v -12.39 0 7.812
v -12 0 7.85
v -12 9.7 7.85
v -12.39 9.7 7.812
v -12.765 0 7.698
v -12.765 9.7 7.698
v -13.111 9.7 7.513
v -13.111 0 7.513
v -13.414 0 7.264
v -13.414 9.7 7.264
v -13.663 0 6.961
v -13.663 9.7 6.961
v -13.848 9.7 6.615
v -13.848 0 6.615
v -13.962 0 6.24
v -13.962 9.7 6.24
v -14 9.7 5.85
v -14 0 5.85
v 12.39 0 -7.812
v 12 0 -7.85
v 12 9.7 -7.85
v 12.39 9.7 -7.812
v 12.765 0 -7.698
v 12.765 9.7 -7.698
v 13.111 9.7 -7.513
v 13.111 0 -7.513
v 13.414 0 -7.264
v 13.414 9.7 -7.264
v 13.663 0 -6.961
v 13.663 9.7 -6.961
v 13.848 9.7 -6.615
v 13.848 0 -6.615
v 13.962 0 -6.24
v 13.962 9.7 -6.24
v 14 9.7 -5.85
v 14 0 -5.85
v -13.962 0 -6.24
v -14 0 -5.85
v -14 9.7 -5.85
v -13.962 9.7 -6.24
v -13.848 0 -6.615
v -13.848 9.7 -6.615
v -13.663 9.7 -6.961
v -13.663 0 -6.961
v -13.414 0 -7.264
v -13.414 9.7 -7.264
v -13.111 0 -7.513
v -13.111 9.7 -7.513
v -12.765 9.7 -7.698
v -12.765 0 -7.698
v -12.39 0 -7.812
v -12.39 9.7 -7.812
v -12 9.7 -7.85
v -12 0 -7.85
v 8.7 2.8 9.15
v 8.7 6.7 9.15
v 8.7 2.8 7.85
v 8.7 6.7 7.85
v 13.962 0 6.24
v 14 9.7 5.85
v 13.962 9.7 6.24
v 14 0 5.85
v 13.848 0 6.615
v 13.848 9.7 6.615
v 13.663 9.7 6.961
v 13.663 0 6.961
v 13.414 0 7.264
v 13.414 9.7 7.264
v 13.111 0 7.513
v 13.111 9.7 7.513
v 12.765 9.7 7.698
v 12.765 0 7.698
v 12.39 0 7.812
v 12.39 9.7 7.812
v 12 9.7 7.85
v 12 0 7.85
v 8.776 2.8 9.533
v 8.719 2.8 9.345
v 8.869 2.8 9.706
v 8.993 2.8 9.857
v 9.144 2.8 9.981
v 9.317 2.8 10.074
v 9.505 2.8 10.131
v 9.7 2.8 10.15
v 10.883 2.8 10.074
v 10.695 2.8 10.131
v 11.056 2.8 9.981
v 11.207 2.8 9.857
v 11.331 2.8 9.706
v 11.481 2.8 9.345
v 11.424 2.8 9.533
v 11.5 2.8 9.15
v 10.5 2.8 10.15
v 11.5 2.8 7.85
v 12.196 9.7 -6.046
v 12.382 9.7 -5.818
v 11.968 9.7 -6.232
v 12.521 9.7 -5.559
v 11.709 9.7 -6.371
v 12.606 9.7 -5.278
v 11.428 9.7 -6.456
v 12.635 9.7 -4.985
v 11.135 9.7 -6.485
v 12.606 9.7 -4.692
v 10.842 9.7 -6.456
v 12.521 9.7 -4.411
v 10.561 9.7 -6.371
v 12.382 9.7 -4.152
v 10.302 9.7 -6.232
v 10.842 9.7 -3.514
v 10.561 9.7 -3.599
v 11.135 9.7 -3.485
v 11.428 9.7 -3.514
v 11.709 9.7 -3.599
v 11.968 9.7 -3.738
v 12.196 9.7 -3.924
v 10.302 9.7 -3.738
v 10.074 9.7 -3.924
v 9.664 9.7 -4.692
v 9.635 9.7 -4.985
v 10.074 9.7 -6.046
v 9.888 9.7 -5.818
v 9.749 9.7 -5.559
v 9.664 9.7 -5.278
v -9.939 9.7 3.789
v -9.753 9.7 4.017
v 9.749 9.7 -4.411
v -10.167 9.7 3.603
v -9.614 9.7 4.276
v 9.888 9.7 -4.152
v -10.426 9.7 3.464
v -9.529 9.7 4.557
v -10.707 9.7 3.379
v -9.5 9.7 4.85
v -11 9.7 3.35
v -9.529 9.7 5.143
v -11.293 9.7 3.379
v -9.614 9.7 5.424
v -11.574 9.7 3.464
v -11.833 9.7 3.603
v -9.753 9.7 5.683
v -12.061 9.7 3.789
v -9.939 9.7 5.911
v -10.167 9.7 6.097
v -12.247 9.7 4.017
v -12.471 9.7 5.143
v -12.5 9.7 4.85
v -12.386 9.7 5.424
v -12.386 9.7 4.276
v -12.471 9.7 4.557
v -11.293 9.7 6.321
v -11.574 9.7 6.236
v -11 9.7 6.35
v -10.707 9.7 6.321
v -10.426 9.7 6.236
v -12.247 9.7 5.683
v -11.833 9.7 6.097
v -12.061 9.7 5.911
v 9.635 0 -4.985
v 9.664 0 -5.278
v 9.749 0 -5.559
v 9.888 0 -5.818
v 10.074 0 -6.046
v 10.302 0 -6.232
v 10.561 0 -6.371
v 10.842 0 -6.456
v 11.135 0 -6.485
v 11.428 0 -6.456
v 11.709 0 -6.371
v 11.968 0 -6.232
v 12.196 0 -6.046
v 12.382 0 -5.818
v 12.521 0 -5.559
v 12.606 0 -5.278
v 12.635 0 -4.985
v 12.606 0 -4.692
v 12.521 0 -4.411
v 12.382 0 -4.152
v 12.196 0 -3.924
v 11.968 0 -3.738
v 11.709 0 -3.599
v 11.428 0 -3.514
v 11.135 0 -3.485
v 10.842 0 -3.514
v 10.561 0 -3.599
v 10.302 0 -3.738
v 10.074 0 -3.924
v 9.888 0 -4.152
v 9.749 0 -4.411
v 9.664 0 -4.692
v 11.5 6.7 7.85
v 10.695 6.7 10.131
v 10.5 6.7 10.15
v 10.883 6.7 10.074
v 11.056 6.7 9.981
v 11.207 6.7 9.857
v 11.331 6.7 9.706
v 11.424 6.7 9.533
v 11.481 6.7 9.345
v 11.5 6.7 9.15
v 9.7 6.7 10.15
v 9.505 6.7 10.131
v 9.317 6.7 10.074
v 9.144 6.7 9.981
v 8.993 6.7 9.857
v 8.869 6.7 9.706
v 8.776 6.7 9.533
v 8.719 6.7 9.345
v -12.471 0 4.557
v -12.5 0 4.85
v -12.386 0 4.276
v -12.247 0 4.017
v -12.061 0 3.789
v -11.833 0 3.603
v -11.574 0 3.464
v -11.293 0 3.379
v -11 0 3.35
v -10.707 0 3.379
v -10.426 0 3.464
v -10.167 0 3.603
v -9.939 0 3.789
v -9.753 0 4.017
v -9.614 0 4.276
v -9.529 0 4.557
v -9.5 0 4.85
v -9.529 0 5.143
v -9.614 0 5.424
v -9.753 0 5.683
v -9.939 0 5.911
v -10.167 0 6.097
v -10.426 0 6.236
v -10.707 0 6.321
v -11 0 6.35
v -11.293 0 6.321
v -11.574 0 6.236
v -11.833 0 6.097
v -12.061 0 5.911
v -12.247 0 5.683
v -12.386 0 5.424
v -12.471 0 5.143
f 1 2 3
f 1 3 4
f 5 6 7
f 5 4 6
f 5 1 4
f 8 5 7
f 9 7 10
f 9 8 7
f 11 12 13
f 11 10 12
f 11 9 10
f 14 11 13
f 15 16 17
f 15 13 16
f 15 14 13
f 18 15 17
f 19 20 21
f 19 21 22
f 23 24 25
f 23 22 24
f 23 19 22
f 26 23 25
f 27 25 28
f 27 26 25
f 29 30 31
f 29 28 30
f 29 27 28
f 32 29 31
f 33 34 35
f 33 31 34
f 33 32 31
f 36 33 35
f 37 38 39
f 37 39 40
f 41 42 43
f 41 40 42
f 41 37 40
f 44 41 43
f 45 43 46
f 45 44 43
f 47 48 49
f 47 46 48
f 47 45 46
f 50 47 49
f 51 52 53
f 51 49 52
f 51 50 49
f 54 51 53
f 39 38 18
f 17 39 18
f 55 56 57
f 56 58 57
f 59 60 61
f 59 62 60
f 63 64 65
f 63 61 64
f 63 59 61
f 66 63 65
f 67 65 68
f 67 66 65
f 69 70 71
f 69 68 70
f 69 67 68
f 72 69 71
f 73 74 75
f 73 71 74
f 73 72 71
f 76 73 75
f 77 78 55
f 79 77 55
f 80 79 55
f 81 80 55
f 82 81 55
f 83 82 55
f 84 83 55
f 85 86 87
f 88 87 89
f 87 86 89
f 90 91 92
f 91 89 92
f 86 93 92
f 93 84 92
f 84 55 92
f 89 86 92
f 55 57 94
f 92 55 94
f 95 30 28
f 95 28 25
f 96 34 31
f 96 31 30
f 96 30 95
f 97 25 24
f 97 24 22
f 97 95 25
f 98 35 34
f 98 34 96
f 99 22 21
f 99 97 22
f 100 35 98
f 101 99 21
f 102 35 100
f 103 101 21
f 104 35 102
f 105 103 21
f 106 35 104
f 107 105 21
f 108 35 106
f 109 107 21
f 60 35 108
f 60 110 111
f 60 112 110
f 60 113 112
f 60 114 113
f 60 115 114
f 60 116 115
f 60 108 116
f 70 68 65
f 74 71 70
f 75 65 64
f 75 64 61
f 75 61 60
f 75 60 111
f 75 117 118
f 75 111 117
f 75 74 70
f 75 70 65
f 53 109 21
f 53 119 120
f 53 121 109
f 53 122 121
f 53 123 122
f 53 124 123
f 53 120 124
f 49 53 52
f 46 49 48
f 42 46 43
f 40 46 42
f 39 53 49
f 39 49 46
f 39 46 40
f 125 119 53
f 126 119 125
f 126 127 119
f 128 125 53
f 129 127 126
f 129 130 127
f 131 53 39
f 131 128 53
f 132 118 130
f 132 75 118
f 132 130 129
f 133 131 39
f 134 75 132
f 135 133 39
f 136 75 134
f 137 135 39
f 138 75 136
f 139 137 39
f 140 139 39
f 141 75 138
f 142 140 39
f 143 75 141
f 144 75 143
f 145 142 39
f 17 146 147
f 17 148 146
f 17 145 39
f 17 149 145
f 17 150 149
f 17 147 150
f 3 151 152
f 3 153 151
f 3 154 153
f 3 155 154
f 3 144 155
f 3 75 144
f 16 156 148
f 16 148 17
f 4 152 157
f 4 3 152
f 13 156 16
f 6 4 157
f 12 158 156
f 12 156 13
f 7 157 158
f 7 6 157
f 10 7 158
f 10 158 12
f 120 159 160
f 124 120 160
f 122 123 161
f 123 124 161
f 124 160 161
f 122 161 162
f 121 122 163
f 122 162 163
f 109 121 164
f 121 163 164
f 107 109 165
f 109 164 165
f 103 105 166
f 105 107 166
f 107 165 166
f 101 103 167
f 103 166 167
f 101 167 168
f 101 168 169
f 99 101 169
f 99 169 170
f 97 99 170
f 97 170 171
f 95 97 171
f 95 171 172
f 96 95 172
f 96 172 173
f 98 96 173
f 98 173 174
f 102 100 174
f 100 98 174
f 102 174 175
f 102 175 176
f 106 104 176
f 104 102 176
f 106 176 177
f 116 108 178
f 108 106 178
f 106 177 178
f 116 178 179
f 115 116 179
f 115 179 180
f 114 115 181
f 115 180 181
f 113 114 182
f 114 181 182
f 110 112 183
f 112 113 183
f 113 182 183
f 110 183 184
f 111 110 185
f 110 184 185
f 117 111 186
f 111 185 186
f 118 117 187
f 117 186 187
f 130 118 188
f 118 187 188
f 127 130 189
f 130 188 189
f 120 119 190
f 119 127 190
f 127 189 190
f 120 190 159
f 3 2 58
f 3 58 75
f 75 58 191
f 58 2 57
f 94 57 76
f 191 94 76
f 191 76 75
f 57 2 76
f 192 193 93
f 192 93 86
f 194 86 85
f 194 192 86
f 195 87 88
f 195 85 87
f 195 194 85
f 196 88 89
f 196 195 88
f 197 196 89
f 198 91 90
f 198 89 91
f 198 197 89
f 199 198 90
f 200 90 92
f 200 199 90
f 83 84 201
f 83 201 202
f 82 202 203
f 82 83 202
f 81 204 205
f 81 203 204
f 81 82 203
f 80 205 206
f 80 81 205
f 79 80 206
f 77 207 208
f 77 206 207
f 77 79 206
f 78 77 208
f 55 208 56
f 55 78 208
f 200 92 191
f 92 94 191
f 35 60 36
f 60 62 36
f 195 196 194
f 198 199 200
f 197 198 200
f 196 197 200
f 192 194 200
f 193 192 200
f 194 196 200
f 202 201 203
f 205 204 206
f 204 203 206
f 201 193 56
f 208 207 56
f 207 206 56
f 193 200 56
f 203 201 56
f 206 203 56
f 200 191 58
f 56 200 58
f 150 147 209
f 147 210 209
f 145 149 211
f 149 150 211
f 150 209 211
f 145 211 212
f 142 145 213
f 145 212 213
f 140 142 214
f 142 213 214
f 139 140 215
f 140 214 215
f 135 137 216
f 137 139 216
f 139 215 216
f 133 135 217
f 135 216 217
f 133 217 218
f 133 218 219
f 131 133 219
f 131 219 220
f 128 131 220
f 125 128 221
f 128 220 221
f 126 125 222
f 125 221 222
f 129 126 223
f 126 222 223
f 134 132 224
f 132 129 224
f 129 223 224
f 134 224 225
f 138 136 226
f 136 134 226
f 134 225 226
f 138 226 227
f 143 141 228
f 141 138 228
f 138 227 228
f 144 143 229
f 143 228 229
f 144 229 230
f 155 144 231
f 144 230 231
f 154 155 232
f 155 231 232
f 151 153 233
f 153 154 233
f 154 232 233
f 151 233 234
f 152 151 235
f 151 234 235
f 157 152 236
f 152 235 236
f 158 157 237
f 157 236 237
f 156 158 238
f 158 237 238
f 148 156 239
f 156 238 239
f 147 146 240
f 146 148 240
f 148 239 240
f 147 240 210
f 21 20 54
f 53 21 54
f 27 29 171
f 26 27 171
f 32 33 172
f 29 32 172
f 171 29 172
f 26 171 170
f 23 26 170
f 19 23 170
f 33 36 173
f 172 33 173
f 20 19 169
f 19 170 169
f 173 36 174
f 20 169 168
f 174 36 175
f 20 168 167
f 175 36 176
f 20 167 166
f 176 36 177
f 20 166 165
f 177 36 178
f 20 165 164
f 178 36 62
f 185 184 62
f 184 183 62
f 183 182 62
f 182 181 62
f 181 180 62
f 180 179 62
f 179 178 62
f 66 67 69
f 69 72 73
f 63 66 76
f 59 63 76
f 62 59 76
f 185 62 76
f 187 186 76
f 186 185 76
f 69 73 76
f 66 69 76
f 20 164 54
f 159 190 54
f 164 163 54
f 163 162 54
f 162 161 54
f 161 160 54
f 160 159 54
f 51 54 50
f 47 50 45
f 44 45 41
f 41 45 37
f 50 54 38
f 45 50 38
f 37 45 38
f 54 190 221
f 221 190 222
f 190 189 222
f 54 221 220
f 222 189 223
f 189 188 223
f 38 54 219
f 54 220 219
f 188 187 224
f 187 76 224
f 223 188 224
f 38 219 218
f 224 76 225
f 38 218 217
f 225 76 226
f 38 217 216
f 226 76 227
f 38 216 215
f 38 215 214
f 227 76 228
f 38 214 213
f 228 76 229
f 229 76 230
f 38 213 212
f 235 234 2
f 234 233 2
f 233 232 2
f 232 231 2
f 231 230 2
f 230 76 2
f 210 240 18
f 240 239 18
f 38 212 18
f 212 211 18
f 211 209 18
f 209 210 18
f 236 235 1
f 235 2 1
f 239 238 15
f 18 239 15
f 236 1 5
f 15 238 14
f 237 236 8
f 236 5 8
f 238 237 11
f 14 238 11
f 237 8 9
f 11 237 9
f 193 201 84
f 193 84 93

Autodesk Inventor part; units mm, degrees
ref_plane "YZ Plane" through (0, 0, 0) normal (1, 0, 0) x (0, 1, 0)
ref_plane "XZ Plane" through (0, 0, 0) normal (0, 1, 0) x (-1, 0, 0)
ref_plane "XY Plane" through (0, 0, 0) normal (0, 0, 1) x (1, 0, 0)
sketch "Sketch1" plane through (0, 0, 0) normal (0, 1, 0) x (-1, 0, 0)
  line L0 (12, 7.85) -> (-12, 7.85)
  line L1 (-14, 5.85) -> (-14, -5.85)
  line L2 (-12, -7.85) -> (12, -7.85)
  line L3 (14, -5.85) -> (14, 5.85)
  line L4 (14, 7.85) -> (-14, -7.85) construction
  line L5 (-14, 7.85) -> (14, -7.85) construction
  arc A0 (14, 5.85) -> (12, 7.85) centre (12, 5.85) ccw
  arc A1 (12, -7.85) -> (14, -5.85) centre (12, -5.85) ccw
  arc A2 (-14, -5.85) -> (-12, -7.85) centre (-12, -5.85) ccw
  arc A3 (-12, 7.85) -> (-14, 5.85) centre (-12, 5.85) ccw
  line L6 (12.5, 8.7909) -> (12.5, -11.3064) construction
  line L7 (15.2914, 6.35) -> (1.3637, 6.35) construction
  circle A4 centre (11, 4.85) radius 1.5
  line L8 (14, 0) -> (-14, 0) construction
  line L9 (0, 7.85) -> (0, -7.85) construction
  circle A5 centre (-11.135, -4.985) radius 1.5
  point P0 (0, 0)
  dimension "d0" = 28
  dimension "d1" = 15.7
  dimension "d2" = 2
  dimension "d3" = 1.5
  dimension "d4" = 1.5
  dimension "d5" = 3
  dimension "d15" = 3
extrude "Extrusion1" add sketch "Sketch1" along normal blind 9.7
sketch "Sketch2" plane through (-12, 0, 7.85) normal (0, 0, 1) x (1, 0, 0)
  line L0 (0, 0) -> (24, 0) construction
  line L1 (24, 0) -> (24, 9.7) construction
  line L2 (0, 9.7) -> (24, 9.7) construction
  line L3 (0, 0) -> (0, 9.7) construction
  line L4 (0, 6.7) -> (24, 6.7) construction
  line L5 (24, 0) -> (24, 9.7) construction
  line L6 (0, 9.7) -> (24, 9.7) construction
  line L7 (23.5, 9.7) -> (23.5, 0) construction
  line L8 (0, 0) -> (24, 0) construction
  line L9 (26, 0) -> (26, 9.7) construction
  line L10 (23.5, 6.7) -> (20.7, 6.7)
  line L11 (20.7, 6.7) -> (20.7, 2.8)
  line L12 (20.7, 2.8) -> (23.5, 2.8)
  line L13 (23.5, 2.8) -> (23.5, 6.7)
  point P0 (12, 0)
  dimension "d8" = 3
  dimension "d9" = 2.5
  dimension "d10" = 2.8
  dimension "d11" = 3.9
extrude "Extrusion2" add sketch "Sketch2" along normal blind 2.3
fillet "Fillet1" radius 1 2 edges at (8.7, 4.75, 10.15) (11.5, 4.75, 10.15)
properties part number "microswitch" material "PET Plastic"
